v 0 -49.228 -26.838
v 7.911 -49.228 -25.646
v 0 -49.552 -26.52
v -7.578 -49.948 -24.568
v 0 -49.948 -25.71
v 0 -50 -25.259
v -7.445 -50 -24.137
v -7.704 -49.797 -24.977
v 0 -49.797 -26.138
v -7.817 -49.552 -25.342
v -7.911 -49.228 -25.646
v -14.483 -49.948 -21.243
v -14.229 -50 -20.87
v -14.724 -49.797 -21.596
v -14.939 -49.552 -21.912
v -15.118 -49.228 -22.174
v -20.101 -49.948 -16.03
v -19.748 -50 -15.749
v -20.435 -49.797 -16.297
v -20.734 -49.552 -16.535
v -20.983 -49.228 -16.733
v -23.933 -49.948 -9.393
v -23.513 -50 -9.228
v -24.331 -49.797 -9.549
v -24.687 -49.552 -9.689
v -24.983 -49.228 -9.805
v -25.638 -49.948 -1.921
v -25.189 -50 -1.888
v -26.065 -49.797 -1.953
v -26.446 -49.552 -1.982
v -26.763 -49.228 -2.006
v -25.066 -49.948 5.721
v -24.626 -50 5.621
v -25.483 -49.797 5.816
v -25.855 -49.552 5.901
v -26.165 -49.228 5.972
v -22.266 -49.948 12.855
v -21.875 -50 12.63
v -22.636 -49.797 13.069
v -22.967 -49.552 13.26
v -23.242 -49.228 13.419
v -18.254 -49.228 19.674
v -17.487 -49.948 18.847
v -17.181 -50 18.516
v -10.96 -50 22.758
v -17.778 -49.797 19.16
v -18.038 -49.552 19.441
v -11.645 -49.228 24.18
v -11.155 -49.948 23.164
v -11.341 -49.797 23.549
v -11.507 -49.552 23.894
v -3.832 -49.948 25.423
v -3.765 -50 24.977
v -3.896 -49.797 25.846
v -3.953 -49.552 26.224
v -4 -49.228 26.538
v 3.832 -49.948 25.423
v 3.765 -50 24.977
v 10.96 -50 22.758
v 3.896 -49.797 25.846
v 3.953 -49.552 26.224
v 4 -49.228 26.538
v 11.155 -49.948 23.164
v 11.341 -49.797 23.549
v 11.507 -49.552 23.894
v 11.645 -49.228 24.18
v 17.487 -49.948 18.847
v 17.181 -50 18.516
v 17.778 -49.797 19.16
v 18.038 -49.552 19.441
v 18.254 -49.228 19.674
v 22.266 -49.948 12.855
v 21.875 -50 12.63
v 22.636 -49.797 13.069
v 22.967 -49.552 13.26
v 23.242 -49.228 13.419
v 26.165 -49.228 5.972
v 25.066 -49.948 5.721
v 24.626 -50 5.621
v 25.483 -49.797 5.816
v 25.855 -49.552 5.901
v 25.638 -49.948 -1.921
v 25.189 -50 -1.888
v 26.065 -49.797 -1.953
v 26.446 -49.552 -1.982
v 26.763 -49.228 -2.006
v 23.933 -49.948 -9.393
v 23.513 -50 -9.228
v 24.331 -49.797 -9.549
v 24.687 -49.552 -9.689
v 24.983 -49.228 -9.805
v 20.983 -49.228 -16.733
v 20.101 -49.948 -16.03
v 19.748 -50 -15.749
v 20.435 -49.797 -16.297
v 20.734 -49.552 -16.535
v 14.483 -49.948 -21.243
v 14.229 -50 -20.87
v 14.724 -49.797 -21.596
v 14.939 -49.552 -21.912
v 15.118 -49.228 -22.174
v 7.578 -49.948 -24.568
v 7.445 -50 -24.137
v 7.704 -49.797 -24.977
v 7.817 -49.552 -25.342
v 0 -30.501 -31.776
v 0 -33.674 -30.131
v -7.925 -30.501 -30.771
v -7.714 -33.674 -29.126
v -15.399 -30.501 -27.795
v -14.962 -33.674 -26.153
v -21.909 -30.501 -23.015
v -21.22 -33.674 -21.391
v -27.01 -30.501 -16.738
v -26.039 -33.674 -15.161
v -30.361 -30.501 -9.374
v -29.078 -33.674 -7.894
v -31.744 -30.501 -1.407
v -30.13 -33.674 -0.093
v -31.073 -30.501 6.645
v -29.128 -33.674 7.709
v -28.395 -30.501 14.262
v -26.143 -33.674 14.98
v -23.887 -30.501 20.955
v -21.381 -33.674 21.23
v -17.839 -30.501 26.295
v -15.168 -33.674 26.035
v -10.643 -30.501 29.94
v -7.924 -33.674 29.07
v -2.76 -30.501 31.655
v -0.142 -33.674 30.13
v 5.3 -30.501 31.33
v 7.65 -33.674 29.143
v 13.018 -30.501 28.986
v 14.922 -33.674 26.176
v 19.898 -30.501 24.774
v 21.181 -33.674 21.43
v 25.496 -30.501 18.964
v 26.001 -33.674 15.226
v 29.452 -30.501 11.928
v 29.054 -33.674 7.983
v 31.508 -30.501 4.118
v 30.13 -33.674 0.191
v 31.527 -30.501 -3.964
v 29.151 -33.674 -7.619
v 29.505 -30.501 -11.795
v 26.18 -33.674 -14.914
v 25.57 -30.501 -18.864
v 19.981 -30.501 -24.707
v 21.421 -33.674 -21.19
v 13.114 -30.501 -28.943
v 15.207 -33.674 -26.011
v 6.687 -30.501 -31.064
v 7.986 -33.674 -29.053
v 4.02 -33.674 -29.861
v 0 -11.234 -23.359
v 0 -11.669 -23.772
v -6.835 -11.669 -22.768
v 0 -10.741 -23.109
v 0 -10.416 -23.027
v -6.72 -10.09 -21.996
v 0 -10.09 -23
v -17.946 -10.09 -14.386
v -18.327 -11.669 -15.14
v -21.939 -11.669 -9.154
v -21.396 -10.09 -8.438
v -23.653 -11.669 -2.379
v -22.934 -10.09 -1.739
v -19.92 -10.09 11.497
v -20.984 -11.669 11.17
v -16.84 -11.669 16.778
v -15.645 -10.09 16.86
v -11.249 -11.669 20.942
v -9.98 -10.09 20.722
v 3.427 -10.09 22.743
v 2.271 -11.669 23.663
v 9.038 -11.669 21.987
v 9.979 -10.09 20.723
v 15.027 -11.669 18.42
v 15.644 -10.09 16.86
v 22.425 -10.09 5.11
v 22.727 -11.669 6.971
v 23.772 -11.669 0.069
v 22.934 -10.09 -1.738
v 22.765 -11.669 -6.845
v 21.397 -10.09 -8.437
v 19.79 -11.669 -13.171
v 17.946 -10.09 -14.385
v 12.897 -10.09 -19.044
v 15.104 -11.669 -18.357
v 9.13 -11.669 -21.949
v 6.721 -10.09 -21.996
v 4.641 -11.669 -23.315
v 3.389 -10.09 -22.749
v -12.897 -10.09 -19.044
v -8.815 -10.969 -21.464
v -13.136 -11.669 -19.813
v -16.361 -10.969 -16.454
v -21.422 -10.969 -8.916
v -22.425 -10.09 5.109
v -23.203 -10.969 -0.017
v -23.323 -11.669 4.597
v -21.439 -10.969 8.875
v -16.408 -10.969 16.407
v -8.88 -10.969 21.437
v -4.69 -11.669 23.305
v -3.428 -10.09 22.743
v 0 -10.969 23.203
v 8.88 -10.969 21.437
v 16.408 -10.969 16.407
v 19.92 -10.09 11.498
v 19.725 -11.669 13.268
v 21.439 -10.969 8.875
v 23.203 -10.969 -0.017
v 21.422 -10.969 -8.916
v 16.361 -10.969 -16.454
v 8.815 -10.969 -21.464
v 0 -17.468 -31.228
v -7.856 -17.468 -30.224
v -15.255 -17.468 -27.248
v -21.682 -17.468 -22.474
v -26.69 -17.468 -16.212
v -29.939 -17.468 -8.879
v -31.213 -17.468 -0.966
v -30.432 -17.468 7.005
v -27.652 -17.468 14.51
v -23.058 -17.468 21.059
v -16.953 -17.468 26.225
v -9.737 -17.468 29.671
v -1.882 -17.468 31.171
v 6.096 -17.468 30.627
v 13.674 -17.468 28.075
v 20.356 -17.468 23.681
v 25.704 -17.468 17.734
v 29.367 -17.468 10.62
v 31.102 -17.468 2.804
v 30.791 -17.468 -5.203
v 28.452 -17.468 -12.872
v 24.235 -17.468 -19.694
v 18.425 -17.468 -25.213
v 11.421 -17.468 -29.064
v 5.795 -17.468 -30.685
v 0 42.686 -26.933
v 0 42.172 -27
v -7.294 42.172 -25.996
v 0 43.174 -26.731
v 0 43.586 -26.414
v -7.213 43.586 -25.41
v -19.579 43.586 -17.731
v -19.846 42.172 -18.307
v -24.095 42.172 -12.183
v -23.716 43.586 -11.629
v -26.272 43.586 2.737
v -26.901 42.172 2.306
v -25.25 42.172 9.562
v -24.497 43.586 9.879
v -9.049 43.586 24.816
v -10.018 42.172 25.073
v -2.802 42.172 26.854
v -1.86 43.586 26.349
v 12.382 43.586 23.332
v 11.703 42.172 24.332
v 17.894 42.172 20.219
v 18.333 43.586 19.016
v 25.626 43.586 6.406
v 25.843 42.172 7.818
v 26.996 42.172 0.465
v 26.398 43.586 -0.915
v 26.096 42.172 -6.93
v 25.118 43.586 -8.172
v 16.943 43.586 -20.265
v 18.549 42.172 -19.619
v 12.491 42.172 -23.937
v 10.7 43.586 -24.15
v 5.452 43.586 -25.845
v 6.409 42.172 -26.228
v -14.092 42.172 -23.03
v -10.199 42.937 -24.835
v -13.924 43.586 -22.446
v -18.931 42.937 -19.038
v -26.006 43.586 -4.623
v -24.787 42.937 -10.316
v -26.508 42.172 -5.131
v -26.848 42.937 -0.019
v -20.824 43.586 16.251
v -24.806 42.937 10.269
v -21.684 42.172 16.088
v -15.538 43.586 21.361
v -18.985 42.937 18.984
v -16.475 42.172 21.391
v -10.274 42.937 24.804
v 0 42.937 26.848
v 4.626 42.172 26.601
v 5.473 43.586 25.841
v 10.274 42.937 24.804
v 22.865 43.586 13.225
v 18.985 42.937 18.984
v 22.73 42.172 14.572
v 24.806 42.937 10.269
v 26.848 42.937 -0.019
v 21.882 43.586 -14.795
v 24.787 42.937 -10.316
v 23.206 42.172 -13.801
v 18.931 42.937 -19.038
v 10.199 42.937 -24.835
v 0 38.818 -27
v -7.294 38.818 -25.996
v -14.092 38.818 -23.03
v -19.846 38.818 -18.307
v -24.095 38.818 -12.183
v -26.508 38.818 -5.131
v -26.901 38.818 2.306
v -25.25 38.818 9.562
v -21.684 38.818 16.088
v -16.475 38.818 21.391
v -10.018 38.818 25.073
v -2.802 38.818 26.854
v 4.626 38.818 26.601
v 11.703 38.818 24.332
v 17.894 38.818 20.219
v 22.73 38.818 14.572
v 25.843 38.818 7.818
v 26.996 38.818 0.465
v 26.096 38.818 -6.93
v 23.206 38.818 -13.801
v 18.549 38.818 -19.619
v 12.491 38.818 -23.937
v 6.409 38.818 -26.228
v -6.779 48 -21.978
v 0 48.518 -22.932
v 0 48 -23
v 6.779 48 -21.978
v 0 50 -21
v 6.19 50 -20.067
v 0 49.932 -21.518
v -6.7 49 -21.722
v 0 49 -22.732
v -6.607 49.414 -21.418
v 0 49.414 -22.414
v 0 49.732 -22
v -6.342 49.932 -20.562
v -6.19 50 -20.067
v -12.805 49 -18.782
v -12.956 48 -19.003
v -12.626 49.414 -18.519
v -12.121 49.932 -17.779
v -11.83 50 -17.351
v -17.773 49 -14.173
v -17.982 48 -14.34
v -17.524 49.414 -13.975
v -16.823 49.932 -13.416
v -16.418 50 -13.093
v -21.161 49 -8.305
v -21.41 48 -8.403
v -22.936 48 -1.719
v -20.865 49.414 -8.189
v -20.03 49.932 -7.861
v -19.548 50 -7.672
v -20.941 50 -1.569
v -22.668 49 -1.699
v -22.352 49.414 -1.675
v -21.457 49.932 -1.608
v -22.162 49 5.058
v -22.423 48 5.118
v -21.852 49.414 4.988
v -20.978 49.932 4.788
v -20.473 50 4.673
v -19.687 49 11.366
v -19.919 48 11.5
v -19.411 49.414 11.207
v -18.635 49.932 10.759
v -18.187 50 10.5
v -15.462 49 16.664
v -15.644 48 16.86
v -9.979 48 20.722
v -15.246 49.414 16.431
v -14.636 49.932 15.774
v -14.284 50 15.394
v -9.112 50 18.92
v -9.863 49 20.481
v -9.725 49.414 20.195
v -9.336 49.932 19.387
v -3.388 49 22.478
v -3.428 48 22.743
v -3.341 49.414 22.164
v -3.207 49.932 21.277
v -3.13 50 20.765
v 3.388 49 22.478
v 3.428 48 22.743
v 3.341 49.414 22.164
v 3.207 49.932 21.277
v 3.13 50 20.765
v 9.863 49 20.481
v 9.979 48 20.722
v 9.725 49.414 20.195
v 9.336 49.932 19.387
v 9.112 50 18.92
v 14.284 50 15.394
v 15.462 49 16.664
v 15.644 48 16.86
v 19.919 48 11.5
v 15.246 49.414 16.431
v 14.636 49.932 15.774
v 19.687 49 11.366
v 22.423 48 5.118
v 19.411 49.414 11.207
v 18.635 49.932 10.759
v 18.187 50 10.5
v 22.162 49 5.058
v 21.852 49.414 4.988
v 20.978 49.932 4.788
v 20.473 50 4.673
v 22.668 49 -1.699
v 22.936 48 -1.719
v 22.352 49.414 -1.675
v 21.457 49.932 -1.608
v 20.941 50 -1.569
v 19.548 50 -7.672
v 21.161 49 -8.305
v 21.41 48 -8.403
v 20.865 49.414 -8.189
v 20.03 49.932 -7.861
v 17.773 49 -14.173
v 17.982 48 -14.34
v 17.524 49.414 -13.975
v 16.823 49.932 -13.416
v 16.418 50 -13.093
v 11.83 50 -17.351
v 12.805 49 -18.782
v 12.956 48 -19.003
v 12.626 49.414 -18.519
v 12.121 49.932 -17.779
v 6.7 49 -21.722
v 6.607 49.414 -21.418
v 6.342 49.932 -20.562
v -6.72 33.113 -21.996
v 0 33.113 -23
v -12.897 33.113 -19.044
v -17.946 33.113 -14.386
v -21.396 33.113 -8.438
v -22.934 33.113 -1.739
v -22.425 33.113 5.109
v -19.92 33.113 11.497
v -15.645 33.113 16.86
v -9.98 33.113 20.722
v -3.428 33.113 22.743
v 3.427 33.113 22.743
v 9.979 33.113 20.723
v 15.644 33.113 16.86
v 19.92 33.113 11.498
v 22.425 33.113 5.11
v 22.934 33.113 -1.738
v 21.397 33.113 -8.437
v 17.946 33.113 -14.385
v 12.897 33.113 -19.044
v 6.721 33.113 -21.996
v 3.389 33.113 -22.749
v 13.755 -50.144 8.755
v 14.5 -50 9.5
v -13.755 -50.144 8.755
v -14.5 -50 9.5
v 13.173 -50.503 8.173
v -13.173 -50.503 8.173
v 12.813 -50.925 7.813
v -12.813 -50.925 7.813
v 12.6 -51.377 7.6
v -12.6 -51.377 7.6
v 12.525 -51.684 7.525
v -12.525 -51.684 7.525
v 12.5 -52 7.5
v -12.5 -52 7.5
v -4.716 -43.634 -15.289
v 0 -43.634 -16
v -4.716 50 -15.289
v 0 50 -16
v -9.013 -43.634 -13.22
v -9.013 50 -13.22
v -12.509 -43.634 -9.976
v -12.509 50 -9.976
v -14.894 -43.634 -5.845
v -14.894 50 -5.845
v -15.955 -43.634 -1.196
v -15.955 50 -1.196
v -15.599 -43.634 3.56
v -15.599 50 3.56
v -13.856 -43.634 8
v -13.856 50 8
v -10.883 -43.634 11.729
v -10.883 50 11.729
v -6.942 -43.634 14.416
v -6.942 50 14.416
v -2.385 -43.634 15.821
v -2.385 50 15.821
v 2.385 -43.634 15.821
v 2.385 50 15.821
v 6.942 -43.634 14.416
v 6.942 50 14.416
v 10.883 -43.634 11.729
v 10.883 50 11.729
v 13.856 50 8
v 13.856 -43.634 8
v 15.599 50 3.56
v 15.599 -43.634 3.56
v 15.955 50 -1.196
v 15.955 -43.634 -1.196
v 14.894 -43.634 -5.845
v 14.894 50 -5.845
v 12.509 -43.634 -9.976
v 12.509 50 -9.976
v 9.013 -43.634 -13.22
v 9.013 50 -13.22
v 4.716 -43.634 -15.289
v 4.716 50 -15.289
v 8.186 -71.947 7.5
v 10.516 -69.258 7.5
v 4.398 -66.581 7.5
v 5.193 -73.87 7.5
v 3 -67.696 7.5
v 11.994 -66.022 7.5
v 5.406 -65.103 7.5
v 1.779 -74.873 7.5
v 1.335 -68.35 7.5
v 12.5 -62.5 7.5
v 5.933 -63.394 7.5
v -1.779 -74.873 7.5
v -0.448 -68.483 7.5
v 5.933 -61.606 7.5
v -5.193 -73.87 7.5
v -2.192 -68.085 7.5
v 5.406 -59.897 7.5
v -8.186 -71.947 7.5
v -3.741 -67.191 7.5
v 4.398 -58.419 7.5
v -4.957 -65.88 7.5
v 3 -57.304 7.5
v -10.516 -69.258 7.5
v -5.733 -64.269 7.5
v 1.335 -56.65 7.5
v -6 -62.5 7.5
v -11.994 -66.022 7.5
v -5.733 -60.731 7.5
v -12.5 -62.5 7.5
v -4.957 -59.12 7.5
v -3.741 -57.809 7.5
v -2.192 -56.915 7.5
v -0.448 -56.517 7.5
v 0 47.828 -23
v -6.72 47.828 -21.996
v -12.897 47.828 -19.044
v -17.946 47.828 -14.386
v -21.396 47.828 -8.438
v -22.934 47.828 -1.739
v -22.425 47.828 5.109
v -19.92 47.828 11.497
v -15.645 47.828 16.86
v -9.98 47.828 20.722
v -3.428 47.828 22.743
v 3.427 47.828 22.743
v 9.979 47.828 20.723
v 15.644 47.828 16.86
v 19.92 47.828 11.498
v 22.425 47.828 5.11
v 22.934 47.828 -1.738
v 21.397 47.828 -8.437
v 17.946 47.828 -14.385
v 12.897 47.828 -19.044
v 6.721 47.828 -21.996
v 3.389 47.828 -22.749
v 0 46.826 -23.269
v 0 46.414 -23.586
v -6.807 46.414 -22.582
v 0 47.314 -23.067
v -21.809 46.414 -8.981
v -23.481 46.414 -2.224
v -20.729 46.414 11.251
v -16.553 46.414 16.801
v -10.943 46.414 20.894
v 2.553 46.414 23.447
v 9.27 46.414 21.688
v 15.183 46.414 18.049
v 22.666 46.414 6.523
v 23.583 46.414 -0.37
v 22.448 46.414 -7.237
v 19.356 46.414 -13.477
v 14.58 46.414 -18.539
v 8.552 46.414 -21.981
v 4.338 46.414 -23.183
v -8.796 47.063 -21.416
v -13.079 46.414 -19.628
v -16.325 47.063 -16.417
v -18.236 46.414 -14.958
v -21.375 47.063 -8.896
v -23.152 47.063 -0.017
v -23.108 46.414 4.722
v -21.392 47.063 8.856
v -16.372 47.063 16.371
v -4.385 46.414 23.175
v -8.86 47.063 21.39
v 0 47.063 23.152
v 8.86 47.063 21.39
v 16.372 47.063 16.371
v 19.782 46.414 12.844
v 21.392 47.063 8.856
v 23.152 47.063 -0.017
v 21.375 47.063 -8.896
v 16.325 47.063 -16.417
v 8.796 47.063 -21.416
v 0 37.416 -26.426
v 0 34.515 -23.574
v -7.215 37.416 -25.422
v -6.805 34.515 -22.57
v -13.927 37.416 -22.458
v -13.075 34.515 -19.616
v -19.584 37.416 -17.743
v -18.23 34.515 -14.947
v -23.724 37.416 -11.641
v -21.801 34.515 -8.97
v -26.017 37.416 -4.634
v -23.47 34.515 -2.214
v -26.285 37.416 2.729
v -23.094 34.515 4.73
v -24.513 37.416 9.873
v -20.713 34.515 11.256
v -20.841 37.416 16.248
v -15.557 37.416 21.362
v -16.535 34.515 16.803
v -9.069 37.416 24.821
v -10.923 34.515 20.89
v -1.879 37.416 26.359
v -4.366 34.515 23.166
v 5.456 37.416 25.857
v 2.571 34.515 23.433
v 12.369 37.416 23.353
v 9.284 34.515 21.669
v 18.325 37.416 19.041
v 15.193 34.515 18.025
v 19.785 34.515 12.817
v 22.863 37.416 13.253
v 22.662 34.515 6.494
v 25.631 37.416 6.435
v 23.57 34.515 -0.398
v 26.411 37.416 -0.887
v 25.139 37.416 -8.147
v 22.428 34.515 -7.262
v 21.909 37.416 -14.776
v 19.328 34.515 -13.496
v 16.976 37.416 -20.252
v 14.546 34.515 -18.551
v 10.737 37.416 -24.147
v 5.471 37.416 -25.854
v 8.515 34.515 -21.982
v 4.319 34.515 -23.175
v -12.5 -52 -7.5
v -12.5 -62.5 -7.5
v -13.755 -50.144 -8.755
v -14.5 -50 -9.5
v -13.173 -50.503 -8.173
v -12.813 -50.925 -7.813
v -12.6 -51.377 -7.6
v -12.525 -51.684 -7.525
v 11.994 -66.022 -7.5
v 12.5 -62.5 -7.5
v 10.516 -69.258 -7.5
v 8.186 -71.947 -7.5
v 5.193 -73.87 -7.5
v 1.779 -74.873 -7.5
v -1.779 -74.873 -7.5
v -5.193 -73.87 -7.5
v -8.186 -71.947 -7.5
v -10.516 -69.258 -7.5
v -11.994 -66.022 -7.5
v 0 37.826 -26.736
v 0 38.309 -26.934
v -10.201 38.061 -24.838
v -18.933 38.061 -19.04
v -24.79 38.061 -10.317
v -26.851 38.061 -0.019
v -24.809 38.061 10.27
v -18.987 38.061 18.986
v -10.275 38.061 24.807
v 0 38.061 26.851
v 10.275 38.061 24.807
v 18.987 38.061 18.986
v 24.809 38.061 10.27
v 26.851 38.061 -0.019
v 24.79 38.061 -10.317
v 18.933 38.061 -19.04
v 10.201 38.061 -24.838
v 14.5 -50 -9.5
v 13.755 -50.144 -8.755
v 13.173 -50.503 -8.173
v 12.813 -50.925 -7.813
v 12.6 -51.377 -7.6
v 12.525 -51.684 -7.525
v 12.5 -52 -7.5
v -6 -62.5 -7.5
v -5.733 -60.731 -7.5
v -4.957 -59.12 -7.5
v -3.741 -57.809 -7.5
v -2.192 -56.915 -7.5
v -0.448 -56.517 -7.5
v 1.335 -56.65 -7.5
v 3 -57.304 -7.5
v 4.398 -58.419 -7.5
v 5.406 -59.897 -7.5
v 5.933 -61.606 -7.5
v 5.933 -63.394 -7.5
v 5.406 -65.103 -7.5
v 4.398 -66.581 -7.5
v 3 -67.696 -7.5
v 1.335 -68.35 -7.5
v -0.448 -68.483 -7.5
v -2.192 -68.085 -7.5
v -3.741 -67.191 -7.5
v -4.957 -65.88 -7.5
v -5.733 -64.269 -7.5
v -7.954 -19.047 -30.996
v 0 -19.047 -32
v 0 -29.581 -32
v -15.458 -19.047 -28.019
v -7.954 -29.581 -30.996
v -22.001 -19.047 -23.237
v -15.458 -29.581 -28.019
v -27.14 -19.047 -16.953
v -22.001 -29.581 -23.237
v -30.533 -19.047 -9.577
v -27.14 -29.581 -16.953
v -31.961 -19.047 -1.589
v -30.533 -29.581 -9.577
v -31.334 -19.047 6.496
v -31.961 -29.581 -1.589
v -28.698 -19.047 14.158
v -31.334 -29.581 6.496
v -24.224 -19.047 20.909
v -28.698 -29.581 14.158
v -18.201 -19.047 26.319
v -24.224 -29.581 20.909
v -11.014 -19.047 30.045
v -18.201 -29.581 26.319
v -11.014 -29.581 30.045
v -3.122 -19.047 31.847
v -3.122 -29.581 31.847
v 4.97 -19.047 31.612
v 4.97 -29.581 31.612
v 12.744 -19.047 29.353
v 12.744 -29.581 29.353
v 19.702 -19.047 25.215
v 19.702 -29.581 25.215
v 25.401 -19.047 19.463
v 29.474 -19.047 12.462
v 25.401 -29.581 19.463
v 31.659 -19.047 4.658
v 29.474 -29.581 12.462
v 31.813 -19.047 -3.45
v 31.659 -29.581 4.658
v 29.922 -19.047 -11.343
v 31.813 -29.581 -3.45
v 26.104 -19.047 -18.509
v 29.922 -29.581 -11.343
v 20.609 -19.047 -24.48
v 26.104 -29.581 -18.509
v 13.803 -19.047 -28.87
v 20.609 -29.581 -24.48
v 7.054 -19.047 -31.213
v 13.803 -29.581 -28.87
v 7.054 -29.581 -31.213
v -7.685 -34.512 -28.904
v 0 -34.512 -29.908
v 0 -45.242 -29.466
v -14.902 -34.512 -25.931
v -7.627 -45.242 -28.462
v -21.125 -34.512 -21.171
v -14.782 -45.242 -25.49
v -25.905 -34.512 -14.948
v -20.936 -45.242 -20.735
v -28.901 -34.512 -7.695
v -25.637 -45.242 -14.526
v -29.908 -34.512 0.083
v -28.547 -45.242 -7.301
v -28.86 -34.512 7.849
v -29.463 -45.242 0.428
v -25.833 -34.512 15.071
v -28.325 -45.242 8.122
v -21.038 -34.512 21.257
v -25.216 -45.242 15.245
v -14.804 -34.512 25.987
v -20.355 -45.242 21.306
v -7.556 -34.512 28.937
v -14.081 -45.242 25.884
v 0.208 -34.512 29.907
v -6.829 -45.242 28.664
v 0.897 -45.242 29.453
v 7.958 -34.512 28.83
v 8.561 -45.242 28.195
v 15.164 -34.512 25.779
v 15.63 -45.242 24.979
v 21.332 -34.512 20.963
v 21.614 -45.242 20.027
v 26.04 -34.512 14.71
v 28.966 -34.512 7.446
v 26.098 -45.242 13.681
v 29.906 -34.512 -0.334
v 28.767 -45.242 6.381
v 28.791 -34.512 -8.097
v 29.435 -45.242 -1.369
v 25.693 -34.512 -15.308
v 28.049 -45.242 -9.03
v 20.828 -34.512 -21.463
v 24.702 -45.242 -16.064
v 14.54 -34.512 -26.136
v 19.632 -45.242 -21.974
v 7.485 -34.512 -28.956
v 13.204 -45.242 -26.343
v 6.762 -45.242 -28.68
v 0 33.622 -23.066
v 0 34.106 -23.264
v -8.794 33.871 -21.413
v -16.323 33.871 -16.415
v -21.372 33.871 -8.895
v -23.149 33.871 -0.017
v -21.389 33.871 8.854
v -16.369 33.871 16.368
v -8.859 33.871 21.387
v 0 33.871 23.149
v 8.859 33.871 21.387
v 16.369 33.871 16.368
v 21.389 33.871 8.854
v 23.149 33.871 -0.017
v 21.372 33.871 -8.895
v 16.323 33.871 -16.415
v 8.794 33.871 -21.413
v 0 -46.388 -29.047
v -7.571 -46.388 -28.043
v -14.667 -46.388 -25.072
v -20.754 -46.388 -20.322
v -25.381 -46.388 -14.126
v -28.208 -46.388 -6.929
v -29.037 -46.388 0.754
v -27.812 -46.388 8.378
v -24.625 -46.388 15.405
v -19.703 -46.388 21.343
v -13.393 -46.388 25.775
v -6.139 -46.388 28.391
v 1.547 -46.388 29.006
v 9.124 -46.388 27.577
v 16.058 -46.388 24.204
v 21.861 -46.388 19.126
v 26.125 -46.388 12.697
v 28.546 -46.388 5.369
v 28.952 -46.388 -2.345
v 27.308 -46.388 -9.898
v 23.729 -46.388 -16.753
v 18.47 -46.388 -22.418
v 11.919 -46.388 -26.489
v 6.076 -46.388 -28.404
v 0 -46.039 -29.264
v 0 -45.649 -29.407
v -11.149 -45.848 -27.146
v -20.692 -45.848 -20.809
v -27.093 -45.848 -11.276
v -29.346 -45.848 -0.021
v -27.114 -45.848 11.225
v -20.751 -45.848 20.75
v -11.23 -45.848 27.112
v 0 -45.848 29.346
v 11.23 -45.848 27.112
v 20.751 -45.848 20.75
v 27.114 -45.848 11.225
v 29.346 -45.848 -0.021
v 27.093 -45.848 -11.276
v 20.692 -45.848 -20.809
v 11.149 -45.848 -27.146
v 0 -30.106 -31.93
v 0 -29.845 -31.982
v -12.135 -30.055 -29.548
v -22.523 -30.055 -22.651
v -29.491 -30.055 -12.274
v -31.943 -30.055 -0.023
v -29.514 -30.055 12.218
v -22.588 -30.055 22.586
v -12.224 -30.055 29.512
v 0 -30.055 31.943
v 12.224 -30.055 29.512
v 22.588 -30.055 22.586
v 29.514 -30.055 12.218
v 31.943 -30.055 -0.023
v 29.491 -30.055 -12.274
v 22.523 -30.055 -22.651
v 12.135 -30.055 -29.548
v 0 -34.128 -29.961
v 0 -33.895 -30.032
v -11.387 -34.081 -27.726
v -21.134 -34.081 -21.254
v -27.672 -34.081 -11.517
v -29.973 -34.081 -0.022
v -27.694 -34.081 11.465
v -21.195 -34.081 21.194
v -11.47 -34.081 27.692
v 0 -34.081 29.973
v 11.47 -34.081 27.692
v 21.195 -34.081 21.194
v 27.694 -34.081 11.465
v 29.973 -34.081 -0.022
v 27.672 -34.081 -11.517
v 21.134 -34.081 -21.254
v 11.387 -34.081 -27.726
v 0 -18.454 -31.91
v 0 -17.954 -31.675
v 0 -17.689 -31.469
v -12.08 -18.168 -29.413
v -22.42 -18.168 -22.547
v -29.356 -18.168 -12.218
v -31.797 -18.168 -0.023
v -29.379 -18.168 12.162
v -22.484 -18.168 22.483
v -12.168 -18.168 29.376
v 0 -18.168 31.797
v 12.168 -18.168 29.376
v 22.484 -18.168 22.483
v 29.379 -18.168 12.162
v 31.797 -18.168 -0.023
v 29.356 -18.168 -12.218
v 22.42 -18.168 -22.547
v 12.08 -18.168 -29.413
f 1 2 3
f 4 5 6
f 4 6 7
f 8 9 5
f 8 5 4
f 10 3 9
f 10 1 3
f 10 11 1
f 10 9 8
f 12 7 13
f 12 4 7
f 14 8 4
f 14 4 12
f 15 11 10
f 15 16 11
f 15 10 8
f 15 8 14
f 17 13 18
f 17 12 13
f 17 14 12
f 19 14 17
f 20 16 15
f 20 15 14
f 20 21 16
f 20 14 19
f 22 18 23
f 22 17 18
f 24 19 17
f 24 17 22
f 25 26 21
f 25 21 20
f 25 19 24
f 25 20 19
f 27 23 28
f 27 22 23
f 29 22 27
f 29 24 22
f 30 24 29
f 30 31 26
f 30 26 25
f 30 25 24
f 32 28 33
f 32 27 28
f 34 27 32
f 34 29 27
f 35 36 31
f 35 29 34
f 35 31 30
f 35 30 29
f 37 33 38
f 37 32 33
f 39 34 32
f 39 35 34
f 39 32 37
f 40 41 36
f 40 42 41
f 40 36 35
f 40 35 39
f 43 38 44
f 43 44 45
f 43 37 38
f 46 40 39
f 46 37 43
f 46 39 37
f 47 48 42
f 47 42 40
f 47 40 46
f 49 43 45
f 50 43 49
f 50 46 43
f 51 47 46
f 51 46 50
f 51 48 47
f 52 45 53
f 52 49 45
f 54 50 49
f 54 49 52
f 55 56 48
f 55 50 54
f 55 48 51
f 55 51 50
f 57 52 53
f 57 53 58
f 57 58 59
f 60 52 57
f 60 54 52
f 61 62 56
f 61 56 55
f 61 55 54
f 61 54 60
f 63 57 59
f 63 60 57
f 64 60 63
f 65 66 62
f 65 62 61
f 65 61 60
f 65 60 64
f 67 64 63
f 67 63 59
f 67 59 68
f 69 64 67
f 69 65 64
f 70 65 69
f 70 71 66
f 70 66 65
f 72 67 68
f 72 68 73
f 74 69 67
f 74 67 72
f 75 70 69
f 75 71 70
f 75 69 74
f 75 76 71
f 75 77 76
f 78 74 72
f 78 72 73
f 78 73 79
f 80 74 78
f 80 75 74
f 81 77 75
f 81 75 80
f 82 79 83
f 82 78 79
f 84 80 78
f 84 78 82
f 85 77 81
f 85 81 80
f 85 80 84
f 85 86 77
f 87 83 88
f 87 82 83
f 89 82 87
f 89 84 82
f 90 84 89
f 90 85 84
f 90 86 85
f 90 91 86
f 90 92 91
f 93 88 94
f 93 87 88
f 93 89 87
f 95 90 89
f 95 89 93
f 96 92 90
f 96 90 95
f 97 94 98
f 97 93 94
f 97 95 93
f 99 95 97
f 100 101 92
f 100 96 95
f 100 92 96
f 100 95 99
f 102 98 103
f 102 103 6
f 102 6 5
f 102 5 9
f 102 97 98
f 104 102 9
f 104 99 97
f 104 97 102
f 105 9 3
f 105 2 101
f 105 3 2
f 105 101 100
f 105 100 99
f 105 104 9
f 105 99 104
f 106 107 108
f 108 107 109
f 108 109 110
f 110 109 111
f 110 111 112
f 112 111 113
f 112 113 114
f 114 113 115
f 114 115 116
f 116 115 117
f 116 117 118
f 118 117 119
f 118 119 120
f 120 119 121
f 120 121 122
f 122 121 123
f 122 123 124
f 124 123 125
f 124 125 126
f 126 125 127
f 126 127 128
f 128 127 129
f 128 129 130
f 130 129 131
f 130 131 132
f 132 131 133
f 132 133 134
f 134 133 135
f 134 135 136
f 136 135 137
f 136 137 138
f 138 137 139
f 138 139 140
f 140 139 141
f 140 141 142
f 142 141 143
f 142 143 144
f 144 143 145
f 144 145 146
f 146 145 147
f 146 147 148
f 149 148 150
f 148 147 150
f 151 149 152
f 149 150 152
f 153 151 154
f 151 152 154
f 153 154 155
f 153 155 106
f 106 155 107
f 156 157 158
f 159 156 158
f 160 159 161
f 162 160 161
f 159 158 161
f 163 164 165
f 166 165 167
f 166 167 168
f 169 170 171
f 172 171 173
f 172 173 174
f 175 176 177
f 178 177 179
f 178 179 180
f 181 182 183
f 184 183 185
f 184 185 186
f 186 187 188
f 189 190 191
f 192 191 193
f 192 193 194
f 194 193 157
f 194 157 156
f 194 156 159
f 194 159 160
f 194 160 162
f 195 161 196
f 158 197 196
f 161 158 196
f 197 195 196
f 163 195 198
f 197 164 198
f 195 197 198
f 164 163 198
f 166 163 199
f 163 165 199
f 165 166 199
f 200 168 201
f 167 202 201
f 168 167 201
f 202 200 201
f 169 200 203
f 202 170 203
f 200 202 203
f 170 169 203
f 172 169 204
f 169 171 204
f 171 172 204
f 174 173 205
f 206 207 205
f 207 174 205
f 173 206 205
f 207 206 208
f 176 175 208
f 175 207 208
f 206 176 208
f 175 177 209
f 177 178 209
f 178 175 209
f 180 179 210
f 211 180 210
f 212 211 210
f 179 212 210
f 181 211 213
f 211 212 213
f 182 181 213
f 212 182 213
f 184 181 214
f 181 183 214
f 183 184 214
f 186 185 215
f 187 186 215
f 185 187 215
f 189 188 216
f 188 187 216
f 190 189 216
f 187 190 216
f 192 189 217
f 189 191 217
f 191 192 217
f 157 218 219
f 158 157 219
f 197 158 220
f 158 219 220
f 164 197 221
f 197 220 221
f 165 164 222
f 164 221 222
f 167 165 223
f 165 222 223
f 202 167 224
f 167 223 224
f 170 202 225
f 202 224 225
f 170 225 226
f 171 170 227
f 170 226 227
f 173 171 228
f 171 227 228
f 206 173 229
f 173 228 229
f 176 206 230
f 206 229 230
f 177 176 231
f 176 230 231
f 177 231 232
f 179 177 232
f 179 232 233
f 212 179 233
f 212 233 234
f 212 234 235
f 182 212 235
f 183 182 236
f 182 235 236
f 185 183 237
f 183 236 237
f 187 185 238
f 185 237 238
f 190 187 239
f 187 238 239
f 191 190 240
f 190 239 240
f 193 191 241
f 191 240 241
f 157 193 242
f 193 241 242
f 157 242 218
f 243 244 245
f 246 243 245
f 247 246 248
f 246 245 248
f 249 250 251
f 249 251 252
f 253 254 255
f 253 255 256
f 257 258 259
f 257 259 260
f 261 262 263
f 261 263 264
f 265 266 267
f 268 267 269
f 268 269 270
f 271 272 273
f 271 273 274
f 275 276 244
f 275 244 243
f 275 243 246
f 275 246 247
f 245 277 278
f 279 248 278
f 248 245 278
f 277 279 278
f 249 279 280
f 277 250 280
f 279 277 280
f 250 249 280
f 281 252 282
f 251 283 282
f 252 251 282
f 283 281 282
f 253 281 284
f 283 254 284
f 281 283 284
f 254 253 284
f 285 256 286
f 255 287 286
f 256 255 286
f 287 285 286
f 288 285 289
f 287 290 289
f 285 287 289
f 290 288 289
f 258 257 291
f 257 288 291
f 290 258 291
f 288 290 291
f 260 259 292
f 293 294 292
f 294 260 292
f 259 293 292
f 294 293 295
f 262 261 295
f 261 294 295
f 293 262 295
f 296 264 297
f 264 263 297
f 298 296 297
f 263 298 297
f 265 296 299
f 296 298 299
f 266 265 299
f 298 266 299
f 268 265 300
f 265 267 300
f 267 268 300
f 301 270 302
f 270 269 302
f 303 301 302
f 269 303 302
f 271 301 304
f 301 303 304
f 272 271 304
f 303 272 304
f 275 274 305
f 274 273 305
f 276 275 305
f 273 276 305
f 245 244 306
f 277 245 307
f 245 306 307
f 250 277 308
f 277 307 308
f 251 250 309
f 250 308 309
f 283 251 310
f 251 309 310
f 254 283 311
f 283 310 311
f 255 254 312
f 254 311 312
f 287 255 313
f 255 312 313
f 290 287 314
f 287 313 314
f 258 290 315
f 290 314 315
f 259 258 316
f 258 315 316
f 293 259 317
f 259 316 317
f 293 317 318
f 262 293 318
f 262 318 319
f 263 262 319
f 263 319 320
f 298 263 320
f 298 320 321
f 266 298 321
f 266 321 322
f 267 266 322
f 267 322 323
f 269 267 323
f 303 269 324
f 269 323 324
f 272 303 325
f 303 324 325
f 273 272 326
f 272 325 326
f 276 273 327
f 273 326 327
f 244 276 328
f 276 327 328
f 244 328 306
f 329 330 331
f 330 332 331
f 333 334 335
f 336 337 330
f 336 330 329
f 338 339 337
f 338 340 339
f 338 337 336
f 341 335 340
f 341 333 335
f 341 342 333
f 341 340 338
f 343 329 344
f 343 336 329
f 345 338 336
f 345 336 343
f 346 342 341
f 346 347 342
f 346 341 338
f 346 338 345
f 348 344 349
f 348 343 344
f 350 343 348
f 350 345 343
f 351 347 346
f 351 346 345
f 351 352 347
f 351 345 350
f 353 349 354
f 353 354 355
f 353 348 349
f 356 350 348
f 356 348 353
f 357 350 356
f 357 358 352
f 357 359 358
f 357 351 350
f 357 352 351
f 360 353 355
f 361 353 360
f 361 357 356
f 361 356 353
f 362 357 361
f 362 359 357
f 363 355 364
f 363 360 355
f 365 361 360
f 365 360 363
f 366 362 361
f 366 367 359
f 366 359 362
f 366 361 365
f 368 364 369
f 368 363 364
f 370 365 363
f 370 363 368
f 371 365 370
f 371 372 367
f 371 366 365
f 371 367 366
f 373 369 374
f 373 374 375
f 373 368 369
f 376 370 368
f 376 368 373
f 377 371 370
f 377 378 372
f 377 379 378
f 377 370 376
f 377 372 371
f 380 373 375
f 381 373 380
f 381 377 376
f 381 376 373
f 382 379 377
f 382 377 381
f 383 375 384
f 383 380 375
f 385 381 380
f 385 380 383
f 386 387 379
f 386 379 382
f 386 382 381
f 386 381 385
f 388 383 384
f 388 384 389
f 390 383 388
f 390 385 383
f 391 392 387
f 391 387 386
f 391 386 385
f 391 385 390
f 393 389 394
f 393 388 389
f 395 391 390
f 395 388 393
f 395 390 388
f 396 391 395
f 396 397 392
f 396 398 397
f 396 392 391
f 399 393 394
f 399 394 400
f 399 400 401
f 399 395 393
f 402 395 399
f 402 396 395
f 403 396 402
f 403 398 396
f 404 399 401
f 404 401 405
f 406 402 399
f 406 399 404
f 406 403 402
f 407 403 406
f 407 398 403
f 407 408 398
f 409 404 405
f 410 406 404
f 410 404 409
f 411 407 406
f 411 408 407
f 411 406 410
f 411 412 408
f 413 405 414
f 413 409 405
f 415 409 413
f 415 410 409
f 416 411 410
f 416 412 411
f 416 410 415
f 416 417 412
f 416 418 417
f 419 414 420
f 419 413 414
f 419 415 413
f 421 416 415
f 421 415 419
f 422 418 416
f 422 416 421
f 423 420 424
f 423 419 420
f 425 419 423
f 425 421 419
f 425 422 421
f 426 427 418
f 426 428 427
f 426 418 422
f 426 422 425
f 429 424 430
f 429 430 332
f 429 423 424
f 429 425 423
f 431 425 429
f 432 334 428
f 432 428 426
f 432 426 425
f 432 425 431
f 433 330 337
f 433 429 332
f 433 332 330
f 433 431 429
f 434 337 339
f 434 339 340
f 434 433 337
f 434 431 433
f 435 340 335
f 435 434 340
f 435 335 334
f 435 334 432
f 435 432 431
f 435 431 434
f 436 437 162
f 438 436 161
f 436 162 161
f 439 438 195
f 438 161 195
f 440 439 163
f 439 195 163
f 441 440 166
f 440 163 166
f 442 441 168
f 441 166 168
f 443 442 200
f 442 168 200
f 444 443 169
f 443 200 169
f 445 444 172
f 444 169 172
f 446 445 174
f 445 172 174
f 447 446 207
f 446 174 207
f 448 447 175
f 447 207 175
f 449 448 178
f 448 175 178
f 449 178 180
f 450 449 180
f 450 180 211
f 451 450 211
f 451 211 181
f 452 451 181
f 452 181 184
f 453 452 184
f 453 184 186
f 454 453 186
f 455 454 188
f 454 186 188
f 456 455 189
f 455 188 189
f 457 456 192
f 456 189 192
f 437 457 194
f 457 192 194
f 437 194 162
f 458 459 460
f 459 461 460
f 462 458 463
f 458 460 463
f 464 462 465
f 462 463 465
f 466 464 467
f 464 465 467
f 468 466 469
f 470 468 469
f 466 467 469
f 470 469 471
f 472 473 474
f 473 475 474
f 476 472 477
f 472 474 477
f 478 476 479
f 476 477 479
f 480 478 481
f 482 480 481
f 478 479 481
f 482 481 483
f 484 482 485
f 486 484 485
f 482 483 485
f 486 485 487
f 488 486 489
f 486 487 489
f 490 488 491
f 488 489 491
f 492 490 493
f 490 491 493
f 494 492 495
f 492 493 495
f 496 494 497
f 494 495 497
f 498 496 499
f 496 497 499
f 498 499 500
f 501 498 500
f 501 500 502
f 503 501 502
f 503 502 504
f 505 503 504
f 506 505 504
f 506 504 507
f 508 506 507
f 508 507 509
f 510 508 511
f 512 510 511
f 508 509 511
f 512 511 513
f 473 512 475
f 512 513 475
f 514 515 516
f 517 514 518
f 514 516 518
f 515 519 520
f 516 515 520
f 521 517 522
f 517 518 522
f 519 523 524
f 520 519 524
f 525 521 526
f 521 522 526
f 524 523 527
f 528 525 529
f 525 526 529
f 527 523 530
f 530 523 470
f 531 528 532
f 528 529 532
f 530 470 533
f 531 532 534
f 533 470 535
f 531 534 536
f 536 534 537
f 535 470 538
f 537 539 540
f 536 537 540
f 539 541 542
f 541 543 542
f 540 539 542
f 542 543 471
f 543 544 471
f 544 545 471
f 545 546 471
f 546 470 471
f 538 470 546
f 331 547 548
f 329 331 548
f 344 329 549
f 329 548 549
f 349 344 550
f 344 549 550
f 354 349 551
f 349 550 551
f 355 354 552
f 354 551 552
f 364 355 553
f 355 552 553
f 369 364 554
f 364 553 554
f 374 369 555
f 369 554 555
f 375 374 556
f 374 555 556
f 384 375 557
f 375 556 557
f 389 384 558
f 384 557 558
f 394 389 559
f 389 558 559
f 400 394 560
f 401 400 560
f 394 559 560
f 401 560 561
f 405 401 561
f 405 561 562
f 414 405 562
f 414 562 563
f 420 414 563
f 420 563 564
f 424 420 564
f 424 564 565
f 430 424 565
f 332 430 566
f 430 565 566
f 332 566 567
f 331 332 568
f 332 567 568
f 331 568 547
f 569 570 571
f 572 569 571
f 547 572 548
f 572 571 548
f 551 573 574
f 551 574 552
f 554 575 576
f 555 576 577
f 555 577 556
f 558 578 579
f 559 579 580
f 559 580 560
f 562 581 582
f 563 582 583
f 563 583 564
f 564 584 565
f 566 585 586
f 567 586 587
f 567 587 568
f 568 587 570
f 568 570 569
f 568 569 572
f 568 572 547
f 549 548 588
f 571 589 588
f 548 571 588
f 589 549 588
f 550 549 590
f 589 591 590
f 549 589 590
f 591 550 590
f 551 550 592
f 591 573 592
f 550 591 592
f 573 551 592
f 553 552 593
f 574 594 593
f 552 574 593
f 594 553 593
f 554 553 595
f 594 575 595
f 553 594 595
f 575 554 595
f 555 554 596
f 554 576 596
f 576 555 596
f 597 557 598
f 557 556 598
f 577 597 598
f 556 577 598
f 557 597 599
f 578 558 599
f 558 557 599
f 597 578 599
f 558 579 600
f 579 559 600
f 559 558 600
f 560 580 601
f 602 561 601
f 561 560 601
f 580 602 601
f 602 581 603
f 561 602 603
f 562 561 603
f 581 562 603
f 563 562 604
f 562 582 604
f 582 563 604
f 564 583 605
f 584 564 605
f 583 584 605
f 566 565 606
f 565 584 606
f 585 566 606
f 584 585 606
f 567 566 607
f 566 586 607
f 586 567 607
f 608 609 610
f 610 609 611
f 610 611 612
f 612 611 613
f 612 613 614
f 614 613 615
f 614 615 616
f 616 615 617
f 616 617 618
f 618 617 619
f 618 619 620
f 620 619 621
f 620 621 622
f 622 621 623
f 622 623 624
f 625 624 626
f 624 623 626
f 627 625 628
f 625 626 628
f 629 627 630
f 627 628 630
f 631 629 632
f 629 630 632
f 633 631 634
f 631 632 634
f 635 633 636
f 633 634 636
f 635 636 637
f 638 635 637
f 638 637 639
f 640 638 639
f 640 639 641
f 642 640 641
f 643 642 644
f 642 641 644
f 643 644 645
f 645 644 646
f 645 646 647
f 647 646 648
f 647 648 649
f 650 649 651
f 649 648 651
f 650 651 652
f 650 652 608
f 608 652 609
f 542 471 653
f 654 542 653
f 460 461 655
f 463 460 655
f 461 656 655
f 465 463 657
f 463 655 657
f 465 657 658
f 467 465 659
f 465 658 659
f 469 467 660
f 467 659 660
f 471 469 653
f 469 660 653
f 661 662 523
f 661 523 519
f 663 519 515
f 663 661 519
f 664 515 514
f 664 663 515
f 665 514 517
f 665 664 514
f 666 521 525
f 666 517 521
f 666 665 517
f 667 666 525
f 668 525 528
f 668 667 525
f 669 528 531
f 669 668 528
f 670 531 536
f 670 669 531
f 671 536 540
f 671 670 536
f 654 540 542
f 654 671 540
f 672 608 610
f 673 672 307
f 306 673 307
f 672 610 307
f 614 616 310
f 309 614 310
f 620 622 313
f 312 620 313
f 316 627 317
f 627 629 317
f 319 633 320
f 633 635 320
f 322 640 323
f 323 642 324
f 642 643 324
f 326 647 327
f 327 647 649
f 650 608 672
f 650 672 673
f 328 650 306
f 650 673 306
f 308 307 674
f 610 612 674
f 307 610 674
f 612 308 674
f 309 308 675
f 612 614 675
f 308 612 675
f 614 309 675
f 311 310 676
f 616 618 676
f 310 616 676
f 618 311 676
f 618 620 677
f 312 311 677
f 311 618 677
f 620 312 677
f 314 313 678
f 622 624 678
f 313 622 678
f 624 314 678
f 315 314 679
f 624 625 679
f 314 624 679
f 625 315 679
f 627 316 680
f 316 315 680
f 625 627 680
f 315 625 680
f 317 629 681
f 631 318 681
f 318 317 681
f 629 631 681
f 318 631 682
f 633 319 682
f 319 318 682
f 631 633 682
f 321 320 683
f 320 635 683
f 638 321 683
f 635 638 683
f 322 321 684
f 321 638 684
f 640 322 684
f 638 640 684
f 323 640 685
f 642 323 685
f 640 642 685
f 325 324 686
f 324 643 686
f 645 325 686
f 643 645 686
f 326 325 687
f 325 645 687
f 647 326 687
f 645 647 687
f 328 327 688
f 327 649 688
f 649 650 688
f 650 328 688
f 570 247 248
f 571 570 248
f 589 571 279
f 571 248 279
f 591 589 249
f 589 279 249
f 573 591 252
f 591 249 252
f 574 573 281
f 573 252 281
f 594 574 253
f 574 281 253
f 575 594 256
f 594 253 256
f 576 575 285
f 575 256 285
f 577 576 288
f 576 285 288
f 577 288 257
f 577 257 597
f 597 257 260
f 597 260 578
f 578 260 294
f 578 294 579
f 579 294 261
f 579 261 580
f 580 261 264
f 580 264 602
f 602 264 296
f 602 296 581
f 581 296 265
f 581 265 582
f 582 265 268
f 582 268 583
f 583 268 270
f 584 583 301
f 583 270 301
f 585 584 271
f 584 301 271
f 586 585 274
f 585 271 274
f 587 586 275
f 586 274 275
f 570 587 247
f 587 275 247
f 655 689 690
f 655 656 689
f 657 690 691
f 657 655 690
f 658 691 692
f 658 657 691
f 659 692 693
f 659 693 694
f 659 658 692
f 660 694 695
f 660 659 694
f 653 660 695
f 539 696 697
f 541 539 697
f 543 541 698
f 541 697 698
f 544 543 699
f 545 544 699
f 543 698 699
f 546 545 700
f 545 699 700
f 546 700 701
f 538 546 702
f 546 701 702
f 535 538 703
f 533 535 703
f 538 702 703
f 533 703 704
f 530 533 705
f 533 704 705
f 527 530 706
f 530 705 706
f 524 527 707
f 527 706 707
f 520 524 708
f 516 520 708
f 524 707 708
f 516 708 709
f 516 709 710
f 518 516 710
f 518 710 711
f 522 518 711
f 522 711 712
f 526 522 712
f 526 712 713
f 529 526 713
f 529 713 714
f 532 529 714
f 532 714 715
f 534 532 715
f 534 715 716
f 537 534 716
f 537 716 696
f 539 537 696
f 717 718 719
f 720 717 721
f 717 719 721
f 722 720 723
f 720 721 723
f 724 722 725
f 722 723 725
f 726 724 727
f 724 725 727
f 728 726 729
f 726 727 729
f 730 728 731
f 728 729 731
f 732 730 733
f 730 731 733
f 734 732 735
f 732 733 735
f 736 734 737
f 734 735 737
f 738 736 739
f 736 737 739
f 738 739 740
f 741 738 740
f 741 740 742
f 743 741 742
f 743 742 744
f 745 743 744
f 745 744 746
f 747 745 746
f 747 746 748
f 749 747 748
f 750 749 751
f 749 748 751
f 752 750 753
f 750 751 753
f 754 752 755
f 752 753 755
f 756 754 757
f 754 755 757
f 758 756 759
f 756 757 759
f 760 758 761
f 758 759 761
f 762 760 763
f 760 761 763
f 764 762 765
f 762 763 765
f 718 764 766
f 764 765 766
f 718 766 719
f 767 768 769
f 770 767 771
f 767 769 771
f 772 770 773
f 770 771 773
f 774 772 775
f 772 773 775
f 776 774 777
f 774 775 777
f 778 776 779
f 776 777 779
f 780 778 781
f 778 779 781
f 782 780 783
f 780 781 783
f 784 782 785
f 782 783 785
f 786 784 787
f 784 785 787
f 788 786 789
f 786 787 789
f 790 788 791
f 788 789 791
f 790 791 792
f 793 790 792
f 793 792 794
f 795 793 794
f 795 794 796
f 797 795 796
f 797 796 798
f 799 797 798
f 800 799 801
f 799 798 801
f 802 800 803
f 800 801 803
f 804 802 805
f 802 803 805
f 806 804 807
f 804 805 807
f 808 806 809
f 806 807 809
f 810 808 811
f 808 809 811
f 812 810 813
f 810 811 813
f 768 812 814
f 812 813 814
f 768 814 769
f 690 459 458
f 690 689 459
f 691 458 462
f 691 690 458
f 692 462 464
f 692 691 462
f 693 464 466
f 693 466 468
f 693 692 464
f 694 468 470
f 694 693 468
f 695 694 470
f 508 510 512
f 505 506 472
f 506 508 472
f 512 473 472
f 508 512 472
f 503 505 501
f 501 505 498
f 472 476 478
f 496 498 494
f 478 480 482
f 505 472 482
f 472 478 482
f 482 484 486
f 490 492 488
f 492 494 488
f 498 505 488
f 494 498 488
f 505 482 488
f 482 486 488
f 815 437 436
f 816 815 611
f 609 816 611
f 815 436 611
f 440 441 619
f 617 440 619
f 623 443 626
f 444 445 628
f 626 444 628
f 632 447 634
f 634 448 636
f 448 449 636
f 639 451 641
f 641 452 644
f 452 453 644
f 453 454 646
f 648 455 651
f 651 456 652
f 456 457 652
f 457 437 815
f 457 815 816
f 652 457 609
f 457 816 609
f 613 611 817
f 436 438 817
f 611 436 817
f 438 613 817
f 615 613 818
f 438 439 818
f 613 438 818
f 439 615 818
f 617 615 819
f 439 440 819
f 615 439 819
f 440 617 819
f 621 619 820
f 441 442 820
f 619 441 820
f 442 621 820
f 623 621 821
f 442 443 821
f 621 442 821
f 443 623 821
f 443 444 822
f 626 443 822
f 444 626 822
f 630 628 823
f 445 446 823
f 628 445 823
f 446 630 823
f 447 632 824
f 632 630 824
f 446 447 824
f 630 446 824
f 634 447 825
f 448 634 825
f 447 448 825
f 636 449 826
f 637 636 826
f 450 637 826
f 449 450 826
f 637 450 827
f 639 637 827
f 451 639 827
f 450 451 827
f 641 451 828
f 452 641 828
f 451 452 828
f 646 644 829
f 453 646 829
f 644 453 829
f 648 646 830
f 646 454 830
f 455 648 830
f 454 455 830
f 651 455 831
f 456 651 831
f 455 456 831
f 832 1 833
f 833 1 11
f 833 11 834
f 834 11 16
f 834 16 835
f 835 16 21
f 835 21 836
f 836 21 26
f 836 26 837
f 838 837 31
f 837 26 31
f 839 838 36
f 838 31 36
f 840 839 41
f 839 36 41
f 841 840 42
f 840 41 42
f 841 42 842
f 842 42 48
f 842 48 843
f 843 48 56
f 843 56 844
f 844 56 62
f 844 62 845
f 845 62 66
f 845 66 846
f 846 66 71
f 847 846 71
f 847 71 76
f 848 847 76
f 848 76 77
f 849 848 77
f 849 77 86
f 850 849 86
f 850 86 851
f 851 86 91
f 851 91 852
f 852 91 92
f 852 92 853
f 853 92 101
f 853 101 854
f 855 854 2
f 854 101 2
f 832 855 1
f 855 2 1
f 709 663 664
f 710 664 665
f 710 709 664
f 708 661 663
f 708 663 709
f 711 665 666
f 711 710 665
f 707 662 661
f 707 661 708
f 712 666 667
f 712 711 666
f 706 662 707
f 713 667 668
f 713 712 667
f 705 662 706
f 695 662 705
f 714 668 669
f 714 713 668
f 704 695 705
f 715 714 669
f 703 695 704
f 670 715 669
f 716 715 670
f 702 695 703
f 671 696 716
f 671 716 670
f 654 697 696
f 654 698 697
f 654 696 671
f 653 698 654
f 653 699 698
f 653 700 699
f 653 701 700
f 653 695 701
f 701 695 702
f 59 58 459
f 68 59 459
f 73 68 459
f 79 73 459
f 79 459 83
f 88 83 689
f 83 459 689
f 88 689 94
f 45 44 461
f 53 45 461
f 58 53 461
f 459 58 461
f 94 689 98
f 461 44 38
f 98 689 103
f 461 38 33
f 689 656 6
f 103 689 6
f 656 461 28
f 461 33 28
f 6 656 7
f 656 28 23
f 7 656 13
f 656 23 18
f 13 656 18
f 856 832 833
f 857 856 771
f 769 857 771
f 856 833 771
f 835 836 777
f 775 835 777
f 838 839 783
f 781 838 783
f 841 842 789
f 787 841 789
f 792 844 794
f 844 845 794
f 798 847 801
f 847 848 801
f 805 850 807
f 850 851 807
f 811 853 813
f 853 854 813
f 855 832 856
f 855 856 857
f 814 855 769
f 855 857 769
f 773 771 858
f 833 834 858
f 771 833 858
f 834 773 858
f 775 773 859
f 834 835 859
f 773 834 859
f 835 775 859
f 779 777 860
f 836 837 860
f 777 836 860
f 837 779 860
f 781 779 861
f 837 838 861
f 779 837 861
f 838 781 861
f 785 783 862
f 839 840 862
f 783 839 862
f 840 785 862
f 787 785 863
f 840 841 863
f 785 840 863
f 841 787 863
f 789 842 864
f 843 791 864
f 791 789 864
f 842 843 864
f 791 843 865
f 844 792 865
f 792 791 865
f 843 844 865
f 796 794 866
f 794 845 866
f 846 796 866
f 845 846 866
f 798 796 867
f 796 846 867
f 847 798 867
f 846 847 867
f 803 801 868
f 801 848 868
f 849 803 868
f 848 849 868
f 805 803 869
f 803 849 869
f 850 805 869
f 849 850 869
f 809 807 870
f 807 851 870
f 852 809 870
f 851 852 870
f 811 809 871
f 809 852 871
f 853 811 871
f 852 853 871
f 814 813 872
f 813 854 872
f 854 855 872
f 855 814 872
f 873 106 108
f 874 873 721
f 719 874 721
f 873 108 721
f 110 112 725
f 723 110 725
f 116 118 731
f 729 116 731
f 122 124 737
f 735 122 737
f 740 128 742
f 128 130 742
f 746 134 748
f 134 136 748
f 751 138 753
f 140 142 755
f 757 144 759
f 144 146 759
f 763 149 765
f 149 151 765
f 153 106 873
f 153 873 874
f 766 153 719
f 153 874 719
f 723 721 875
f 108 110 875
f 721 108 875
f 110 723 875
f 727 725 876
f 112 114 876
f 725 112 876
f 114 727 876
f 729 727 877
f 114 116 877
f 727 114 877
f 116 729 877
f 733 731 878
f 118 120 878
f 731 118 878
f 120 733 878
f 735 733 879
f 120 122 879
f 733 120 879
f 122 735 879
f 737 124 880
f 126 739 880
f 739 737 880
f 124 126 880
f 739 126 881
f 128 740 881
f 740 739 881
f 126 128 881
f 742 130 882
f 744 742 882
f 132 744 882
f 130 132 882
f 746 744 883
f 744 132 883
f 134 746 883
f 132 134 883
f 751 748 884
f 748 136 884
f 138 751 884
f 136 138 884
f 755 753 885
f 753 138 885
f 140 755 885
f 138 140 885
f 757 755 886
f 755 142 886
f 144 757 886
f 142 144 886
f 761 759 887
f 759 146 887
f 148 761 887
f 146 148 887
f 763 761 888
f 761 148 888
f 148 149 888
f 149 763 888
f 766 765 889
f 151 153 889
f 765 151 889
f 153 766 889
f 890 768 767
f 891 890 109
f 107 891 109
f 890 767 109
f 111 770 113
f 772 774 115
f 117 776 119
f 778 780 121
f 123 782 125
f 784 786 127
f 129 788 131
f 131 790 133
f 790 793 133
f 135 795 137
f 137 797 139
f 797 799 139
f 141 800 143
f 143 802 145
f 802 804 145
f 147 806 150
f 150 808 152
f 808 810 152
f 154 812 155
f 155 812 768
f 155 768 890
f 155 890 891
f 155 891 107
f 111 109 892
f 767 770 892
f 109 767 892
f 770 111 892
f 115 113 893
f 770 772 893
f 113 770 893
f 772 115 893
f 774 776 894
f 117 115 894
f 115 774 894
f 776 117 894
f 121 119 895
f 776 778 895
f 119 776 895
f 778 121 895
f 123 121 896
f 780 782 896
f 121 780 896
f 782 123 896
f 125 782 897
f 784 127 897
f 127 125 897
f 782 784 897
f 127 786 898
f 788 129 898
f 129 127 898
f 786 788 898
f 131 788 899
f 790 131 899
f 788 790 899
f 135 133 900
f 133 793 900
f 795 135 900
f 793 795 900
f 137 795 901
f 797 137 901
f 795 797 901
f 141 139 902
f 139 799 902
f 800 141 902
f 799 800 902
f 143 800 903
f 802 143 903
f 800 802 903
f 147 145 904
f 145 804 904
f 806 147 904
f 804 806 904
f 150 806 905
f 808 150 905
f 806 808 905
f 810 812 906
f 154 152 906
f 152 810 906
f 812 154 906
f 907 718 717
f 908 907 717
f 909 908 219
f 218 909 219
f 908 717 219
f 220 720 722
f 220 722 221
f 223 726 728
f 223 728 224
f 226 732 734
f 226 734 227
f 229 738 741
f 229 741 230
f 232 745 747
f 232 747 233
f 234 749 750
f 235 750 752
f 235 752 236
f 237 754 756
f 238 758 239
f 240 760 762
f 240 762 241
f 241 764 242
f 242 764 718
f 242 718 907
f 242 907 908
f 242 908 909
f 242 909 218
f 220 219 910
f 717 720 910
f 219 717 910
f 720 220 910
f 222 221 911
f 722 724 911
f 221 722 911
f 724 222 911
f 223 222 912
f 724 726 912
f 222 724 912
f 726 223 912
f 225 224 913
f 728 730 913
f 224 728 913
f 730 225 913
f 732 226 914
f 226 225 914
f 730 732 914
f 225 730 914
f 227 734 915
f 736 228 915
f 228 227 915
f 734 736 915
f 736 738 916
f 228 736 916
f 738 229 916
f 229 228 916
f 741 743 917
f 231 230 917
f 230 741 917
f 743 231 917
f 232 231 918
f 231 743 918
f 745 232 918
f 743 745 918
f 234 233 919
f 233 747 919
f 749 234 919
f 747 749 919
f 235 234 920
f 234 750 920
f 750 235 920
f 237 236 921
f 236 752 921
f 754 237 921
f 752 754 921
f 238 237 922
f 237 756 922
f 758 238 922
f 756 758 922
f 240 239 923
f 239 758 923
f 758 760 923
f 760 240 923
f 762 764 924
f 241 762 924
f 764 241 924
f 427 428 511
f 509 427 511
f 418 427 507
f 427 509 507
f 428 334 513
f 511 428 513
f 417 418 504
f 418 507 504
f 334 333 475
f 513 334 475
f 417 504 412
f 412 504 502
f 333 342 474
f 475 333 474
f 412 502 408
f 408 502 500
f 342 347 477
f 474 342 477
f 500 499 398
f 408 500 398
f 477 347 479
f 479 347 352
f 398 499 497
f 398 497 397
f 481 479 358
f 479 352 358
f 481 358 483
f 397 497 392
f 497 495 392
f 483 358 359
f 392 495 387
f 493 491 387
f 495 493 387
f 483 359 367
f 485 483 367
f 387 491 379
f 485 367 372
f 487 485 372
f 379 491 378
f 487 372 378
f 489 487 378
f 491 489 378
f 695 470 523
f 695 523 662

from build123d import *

# Parameters (mm, degrees)
SKETCH_2_W          = 25
SKETCH_2_H          = 15
EXTRUDE_1_DEPTH     = 25
SKETCH_3_R          = 6
CUT_EXTRUDE_1_DEPTH = 91.604911567
FILLET_1_R          = 2
FILLET_2_R          = 2
FILLET_3_R          = 2


with BuildPart() as part:
    # Эскиз1 → Повернуть2 (revolve)
    with BuildSketch(Plane.XY, mode=Mode.PRIVATE) as revolve_2_sk:
        Polygon((-16, -43.634046593), (-16, 50), (-23, 50), (-23, 47), (-27, 43), (-27, 38), (-23, 33.931509151), (-23, -11.068490849), (-32, -18.068490849), (-32, -30.068490849), (-29.926030457, -34.068490849), (-29.440017083, -45.882241974), (-26.237316396, -50), (0, -50), (0, -43.634046593), align=None)
    revolve(revolve_2_sk.sketch.rotate(Axis((0, -50, 0), (0, 1, 0)), 270), axis=Axis((0, -50, 0), (0, 1, 0)))

    # Эскиз2 → Бобышка-Вытянуть1 (add)
    with BuildSketch(Plane(origin=(0, -50, 0), x_dir=(-1, 0, 0), z_dir=(0, -1, 0))):
        Rectangle(SKETCH_2_W, SKETCH_2_H)
    extrude(amount=EXTRUDE_1_DEPTH)

    # Эскиз3 → Вырез-Вытянуть1 (cut, through all)
    with BuildSketch(Plane(origin=(0, 0, -7.5), x_dir=(-1, 0, 0), z_dir=(0, 0, -1))):
        with Locations((0, -62.5)):
            Circle(SKETCH_3_R)
        with BuildLine():
            Line((12.5, -62.5), (18.10311098, -62.5))
            Line((18.10311098, -62.5), (18.10311098, -97.820342189))
            Line((18.10311098, -97.820342189), (-20.039236713, -97.820342189))
            Line((-20.039236713, -97.820342189), (-20.039236713, -62.5))
            Line((-20.039236713, -62.5), (-12.5, -62.5))
            ThreePointArc((-12.5, -62.5), (0, -75), (12.5, -62.5))
        make_face()
    extrude(amount=-CUT_EXTRUDE_1_DEPTH, mode=Mode.SUBTRACT)

    # Скругление1
    fillet_1_edges = [part.edges().sort_by_distance(p)[0] for p in [
        (12.5, -50, 0),
        (0, -50, 7.5),
        (-12.5, -50, 0),
        (0, -50, -7.5),
    ]]
    fillet(fillet_1_edges, radius=FILLET_1_R)

    # Скругление2
    fillet_2_edges = [part.edges().sort_by_distance(p)[0] for p in [
        (0, -45.882241974, 29.440017083),
        (0, -34.068490849, 29.926030457),
        (0, -30.068490849, 32),
        (0, -18.068490849, 32),
        (0, -11.068490849, 23),
        (0, 38, 27),
        (0, 43, 27),
        (0, 47, 23),
        (0, -50, 26.237316396),
    ]]
    fillet(fillet_2_edges, radius=FILLET_2_R)

    # Скругление3
    fillet_3_edges = [part.edges().sort_by_distance(p)[0] for p in [
        (0, 33.931509151, 23),
        (0, 50, 23),
    ]]
    fillet(fillet_3_edges, radius=FILLET_3_R)


solid = part.part
